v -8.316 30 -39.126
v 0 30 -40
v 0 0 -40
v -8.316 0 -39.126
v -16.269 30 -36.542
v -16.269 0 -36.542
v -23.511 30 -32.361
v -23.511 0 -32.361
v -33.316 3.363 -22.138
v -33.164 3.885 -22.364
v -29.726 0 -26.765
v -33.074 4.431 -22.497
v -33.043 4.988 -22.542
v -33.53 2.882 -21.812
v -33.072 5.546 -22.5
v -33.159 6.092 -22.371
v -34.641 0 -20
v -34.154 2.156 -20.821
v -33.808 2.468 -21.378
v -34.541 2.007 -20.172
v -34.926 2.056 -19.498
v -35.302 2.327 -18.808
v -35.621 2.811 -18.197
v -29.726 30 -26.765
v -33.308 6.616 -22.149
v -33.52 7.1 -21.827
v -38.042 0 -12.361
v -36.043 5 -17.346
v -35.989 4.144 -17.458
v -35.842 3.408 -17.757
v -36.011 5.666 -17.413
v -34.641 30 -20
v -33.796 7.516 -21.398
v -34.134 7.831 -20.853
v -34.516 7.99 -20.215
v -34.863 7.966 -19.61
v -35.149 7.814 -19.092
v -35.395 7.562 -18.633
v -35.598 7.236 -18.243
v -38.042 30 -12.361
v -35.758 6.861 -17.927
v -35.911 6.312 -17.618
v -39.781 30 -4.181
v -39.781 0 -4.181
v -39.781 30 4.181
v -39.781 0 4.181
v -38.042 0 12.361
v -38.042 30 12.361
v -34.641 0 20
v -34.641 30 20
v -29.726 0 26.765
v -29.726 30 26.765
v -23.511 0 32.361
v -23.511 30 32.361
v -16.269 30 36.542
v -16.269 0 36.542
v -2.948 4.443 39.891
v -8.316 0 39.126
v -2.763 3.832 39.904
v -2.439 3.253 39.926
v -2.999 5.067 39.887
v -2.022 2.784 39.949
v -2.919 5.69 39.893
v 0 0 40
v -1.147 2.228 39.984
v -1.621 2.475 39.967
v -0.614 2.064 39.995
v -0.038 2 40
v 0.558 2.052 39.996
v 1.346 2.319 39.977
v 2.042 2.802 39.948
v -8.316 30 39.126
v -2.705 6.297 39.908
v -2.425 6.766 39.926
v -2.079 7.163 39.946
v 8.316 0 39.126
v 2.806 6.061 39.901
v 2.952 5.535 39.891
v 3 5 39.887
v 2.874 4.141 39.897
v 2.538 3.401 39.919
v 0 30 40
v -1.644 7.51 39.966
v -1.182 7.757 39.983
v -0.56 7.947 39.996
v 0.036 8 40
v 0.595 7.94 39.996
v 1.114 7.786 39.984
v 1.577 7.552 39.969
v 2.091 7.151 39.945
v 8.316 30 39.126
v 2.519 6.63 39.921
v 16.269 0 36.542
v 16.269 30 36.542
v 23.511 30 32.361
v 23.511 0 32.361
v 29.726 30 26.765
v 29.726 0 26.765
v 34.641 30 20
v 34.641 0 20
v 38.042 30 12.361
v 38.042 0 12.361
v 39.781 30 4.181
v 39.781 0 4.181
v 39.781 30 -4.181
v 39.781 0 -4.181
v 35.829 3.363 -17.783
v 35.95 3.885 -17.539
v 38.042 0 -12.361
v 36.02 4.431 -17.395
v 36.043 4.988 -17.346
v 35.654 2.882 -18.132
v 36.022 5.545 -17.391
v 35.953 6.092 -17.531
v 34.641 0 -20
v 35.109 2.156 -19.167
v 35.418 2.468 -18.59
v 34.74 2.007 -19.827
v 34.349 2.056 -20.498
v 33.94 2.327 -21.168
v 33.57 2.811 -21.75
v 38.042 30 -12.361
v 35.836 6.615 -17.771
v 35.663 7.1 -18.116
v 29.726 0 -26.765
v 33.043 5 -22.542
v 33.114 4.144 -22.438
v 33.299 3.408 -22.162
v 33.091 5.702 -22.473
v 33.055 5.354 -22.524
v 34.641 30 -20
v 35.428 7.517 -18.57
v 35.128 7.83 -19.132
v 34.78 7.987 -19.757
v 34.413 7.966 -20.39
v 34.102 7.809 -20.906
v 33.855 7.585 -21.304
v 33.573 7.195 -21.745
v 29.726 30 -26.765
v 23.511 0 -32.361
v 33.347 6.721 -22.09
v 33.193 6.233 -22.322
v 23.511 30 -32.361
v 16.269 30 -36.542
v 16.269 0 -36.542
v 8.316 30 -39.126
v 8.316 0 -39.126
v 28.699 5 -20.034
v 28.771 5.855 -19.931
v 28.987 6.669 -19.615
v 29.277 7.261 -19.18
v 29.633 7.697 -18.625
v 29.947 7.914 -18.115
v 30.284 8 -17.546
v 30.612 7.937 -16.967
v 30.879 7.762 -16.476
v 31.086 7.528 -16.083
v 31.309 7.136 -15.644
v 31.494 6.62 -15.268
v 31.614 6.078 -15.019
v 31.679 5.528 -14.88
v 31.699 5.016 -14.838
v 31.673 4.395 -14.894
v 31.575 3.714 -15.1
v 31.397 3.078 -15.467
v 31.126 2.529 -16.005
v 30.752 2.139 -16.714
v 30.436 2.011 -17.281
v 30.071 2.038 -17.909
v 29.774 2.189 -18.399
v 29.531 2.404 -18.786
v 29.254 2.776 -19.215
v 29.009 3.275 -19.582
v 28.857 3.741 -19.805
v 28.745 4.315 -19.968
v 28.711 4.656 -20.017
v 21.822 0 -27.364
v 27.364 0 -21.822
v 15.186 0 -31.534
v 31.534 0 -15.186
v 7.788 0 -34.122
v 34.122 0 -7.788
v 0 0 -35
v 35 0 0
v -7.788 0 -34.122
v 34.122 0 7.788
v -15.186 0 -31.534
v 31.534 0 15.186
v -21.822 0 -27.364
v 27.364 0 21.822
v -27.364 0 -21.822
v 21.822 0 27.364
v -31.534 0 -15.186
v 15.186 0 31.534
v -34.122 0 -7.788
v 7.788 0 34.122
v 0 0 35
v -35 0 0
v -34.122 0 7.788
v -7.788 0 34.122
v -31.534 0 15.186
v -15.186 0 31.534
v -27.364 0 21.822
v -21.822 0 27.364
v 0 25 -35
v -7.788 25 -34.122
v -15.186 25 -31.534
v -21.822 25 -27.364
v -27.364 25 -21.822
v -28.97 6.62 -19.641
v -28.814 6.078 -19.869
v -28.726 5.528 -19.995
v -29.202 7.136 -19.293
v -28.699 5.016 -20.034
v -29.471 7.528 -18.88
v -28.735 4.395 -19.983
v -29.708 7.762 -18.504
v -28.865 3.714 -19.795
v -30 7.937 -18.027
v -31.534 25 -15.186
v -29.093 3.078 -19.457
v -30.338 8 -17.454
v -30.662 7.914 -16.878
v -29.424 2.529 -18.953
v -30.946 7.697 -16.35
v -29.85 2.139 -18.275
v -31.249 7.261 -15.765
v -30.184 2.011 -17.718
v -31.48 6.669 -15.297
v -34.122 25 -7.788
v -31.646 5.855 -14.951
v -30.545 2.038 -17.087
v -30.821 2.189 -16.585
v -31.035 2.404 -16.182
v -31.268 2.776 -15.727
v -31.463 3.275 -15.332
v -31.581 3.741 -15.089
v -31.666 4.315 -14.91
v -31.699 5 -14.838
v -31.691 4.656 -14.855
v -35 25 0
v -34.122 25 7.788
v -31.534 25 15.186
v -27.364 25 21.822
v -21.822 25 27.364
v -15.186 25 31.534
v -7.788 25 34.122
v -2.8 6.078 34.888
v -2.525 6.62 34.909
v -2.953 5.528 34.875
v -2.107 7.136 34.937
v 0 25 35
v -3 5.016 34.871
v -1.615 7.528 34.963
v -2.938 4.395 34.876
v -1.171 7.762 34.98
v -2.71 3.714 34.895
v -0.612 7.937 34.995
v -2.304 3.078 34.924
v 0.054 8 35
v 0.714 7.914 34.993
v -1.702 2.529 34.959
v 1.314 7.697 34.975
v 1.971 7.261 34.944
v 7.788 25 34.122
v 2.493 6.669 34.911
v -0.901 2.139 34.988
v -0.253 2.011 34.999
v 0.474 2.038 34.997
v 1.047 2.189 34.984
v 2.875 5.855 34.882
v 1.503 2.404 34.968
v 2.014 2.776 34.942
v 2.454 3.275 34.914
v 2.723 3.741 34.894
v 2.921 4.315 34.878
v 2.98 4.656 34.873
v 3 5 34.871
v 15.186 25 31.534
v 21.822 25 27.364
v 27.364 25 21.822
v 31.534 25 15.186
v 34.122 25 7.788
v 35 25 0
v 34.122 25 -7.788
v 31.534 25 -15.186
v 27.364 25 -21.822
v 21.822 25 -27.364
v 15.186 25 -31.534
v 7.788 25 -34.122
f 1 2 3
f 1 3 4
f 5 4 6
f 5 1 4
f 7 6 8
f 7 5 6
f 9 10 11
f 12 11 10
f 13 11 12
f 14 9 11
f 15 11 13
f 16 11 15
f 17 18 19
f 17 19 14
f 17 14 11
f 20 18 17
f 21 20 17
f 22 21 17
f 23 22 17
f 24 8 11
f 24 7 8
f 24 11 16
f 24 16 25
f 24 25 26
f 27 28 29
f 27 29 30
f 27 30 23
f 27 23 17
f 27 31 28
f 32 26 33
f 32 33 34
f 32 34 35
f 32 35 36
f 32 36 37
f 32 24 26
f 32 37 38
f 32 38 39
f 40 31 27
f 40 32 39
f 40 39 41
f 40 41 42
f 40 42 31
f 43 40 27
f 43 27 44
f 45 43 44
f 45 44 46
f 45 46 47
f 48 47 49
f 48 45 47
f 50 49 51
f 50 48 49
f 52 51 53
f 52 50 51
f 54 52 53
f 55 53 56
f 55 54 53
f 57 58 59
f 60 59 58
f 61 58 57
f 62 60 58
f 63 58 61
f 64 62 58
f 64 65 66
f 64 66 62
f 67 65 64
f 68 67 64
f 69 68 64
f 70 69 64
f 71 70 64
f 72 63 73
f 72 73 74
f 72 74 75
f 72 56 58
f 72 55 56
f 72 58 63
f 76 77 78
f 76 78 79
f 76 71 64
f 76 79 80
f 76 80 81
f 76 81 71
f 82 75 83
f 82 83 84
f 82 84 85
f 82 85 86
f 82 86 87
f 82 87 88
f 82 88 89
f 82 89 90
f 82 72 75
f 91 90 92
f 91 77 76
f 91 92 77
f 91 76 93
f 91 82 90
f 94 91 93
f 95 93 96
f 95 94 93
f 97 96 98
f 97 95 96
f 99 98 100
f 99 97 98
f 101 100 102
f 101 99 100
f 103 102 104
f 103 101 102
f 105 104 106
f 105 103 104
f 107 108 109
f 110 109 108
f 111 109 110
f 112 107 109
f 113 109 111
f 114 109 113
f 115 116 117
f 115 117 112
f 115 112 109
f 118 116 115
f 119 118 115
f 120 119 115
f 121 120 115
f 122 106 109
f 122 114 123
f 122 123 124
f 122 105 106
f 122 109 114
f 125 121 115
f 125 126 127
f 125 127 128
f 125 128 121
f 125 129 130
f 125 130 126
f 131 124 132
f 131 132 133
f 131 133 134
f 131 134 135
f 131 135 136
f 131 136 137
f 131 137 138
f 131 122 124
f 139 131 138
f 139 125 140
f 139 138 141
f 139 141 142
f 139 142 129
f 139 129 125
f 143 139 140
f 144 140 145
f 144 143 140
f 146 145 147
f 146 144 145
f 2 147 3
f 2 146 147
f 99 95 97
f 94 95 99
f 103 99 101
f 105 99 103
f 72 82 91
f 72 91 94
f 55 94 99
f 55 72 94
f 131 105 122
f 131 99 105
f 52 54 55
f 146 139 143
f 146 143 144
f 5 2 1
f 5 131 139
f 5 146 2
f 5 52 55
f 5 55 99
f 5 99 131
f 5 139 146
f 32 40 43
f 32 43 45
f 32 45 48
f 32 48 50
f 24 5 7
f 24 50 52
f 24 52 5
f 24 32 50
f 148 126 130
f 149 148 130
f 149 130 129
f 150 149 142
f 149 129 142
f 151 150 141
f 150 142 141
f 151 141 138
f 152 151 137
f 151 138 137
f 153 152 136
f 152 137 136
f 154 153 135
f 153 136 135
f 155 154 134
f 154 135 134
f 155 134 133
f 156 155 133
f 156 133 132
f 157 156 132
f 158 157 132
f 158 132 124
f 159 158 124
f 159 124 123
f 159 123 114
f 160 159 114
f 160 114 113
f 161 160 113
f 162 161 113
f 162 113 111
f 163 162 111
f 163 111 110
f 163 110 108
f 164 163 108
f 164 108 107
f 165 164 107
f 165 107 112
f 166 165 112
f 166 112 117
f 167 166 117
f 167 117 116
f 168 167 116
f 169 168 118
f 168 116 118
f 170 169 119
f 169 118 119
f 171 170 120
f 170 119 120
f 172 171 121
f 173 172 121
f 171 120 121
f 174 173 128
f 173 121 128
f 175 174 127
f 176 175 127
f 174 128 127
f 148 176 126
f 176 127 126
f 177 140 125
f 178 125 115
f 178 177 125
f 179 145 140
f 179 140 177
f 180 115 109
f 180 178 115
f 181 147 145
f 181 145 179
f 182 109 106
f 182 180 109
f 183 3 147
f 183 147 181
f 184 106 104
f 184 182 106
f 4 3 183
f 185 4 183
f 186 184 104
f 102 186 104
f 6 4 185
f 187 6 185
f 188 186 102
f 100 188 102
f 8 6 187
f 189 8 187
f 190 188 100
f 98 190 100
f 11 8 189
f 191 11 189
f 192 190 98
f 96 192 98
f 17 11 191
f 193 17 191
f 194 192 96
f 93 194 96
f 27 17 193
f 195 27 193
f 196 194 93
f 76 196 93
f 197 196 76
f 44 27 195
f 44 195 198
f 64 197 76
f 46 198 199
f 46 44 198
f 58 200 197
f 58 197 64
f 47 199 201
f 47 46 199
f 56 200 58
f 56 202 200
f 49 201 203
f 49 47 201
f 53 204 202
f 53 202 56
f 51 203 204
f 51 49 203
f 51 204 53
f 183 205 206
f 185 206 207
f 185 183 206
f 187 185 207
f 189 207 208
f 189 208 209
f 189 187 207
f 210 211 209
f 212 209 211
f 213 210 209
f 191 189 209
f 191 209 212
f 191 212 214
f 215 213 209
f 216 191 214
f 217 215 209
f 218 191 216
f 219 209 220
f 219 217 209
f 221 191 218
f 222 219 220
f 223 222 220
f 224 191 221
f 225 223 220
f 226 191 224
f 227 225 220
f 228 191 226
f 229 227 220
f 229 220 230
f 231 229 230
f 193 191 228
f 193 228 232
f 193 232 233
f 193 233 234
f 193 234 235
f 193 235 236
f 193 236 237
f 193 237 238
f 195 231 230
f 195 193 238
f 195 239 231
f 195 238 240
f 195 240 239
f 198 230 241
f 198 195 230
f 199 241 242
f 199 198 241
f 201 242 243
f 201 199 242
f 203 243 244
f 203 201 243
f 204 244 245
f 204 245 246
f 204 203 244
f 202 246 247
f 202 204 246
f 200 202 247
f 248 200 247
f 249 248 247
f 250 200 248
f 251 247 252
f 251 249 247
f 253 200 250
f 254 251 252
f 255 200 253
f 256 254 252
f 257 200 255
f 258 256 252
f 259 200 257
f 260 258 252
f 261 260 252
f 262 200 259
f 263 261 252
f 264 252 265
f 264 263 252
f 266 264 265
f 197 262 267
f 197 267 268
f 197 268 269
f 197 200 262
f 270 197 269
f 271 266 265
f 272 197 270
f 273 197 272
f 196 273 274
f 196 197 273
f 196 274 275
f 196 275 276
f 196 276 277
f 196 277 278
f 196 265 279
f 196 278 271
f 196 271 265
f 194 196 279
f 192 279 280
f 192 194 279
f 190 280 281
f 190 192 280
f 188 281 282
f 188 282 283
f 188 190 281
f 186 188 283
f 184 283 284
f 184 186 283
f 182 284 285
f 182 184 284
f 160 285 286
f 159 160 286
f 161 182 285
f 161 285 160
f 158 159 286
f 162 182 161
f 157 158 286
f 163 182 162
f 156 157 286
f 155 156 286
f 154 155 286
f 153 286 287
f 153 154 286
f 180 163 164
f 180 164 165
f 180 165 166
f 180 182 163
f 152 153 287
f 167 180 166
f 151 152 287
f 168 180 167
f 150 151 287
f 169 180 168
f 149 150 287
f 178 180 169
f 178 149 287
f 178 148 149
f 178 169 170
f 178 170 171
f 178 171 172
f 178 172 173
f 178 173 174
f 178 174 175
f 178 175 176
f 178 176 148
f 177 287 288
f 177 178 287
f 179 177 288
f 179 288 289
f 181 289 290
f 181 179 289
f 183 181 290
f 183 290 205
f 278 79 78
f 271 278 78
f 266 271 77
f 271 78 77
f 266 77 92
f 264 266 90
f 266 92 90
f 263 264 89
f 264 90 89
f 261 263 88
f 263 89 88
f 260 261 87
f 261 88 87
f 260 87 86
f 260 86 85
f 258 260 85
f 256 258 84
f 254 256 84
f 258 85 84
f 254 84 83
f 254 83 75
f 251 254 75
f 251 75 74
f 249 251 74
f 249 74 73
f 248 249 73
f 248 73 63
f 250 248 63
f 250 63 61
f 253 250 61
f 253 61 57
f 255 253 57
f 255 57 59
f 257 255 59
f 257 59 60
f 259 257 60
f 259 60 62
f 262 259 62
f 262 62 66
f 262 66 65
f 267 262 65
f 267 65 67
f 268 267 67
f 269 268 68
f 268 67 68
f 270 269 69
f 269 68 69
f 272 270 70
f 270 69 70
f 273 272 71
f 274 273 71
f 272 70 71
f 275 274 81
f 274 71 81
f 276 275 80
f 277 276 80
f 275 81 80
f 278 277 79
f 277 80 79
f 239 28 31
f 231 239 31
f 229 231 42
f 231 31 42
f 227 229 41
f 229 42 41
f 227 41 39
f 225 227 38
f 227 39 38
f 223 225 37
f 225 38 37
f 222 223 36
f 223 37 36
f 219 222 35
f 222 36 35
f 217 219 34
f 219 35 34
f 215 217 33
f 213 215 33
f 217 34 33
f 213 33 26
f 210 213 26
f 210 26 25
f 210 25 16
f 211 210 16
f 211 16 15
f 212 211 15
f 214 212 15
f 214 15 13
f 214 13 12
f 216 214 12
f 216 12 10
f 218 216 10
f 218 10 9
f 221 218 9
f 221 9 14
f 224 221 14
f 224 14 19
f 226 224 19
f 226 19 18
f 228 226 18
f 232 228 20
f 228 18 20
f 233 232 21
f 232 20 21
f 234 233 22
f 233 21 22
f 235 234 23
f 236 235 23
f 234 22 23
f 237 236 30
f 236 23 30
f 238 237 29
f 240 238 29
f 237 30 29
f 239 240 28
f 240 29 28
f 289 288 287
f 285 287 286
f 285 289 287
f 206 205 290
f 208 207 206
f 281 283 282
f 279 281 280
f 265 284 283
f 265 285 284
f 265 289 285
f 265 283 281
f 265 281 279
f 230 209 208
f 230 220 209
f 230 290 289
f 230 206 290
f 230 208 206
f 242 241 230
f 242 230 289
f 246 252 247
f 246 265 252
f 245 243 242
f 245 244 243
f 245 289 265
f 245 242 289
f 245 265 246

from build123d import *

# Parameters (mm, degrees)
CUT_EXTRUDE1_REACH      = 96.34
CUT_EXTRUDE1_END_RADIUS = 35
SKETCH2_R               = 3
CIRPATTERN1_COUNT       = 3


with BuildPart() as part:
    # Sketch1 → Revolve1 (revolve)
    with BuildSketch(Plane.XY, mode=Mode.PRIVATE) as revolve1_sk:
        Polygon((-40, 30), (0, 30), (0, 25), (-35, 25), (-35, 0), (-40, 0), align=None)
    revolve(revolve1_sk.sketch.rotate(Axis((0, -63.953488372, 0), (0, 1, 0)), 270), axis=Axis((0, -63.953488372, 0), (0, 1, 0)))

    # Cut-Extrude1: up to this cylinder (the profile starts outside it)
    cut_extrude1_end = Plane(origin=(0, 5, 0), z_dir=(0, -1, 0)) * Cylinder(CUT_EXTRUDE1_END_RADIUS, 263.68, mode=Mode.PRIVATE)
    # Sketch2 → Cut-Extrude1 (cut, up to the surface)
    with BuildSketch(Plane.XY.offset(40), mode=Mode.PRIVATE) as cut_extrude1_sk1:
        with Locations((0, 5)):
            Circle(SKETCH2_R)
    cut_extrude1_tool1 = extrude(cut_extrude1_sk1.sketch, amount=-CUT_EXTRUDE1_REACH, mode=Mode.PRIVATE) - cut_extrude1_end
    cut_extrude1 = cut_extrude1_tool1.solids().sort_by_distance((0, 5, 40))[0]
    add(cut_extrude1, mode=Mode.SUBTRACT)

    # CirPattern1: Cut-Extrude1 ×3 about axis
    cirpattern1_axis = Axis((0, -63.953488372, 0), (0, 1, 0))
    for i in range(1, CIRPATTERN1_COUNT):
        add(cut_extrude1.rotate(cirpattern1_axis, i * 360 / CIRPATTERN1_COUNT), mode=Mode.SUBTRACT)


solid = part.part
